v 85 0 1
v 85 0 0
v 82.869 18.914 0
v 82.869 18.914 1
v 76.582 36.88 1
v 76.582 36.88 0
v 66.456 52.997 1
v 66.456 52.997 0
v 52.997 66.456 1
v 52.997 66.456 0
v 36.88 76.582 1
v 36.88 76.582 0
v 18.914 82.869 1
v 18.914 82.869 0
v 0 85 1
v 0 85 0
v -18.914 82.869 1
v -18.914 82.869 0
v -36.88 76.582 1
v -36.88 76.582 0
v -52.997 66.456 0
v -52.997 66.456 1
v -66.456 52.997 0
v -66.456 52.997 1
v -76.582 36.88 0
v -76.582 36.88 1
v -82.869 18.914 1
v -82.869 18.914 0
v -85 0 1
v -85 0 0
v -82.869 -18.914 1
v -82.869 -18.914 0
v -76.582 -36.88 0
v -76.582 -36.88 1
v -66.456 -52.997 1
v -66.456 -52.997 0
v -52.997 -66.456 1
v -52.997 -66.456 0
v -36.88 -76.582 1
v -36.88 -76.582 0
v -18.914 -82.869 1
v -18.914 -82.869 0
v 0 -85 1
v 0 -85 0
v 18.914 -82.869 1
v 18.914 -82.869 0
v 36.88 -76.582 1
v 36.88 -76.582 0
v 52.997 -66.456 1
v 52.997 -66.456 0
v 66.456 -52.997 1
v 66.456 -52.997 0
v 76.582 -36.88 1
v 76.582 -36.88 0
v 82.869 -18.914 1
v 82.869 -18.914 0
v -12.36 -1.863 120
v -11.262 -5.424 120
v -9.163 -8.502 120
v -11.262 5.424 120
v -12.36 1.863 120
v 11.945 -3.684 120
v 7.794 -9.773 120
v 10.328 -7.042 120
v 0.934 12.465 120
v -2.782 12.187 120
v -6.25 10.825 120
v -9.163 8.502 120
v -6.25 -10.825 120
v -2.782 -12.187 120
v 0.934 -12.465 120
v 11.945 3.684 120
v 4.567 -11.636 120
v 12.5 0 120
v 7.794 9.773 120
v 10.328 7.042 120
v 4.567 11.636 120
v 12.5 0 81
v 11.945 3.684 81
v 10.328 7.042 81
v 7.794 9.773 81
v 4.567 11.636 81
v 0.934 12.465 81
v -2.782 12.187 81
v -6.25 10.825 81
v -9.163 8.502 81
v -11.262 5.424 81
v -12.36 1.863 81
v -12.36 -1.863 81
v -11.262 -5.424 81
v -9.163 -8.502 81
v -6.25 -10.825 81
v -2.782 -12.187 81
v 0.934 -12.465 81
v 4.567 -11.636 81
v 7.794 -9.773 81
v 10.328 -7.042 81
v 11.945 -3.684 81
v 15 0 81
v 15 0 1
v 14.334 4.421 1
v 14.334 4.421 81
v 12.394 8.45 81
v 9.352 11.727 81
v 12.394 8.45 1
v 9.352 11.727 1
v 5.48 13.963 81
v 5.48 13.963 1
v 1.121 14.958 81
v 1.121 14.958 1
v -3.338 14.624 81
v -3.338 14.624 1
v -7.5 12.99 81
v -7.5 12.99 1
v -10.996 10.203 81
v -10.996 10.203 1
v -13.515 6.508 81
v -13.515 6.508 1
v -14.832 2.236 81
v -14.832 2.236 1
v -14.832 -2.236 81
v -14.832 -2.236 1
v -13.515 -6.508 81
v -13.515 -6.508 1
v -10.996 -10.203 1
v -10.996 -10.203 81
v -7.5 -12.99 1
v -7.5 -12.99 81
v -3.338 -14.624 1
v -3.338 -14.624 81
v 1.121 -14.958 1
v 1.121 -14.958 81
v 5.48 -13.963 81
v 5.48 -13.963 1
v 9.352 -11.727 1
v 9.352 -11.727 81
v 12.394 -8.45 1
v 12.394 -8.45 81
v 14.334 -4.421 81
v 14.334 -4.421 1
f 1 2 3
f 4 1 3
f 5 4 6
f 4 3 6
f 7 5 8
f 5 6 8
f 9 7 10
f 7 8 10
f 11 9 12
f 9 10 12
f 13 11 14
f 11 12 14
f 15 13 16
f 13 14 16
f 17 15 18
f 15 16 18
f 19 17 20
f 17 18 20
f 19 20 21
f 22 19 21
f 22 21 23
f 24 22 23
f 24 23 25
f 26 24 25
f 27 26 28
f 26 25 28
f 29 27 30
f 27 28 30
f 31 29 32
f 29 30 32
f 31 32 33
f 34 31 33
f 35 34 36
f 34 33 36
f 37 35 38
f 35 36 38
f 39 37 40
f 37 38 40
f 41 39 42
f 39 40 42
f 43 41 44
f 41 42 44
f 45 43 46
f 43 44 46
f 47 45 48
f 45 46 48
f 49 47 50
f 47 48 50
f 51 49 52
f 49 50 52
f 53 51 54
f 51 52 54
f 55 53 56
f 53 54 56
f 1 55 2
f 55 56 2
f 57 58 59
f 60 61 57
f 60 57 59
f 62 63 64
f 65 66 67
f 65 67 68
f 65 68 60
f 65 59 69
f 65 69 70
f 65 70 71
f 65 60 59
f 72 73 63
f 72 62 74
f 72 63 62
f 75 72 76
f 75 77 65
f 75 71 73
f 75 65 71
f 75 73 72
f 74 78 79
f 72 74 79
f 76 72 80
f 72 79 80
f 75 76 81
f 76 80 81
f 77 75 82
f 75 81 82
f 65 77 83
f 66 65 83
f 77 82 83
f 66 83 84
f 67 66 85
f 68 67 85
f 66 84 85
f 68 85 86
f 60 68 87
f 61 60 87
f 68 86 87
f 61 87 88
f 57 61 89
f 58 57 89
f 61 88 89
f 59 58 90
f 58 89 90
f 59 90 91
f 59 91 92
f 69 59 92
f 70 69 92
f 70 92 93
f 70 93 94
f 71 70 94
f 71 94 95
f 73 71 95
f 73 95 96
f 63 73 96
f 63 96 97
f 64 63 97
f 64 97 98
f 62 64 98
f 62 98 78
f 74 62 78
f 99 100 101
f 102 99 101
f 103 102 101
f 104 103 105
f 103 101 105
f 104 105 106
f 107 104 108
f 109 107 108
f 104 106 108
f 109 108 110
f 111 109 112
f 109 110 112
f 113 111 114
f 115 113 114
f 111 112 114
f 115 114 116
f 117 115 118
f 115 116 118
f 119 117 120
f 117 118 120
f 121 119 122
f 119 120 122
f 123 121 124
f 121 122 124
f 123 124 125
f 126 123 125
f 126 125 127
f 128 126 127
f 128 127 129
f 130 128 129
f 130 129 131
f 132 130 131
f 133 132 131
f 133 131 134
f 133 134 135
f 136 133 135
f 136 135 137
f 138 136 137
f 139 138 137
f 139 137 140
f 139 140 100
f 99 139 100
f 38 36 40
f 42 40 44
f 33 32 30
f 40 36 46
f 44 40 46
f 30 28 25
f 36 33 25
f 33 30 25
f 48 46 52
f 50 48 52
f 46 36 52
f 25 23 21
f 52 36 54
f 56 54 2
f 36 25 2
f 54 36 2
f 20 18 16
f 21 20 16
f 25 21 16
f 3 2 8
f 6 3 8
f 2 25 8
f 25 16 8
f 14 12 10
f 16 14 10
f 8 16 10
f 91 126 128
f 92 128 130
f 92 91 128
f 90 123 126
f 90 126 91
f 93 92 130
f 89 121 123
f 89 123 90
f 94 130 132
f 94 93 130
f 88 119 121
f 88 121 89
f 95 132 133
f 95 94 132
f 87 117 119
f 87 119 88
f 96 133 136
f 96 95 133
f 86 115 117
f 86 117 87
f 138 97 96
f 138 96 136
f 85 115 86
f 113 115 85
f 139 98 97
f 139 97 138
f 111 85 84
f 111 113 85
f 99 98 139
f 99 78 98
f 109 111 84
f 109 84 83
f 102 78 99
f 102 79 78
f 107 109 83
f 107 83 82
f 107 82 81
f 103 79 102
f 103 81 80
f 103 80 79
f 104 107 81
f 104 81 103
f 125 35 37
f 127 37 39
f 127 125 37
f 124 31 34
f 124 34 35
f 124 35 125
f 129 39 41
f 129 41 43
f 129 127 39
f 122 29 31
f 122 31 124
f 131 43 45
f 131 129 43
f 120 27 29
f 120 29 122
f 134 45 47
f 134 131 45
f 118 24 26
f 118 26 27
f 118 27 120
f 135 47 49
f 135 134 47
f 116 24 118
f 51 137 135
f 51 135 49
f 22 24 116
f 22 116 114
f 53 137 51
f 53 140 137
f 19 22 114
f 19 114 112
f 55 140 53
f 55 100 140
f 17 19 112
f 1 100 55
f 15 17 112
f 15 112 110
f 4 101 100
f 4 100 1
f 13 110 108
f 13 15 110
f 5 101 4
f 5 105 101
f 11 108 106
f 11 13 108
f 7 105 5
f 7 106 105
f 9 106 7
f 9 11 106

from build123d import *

# Parameters (mm, degrees)
SKETCH_1_R      = 85
SKETCH_1_R_2    = 15
EXTRUDE_1_DEPTH = 1
SKETCH_1_3_R    = 15
EXTRUDE_2_DEPTH = 81
SKETCH_1_4_R    = 12.5
EXTRUDE_3_DEPTH = 120


with BuildPart() as part:
    # 草图1 → 凸台-拉伸1 (new body)
    with BuildSketch(Plane.XY):
        Circle(SKETCH_1_R)
        Circle(SKETCH_1_R_2, mode=Mode.SUBTRACT)
    extrude(amount=EXTRUDE_1_DEPTH)

    # 草图1<3> → 凸台-拉伸2 (add)
    with BuildSketch(Plane.XY):
        Circle(SKETCH_1_3_R)
    extrude(amount=EXTRUDE_2_DEPTH)

    # 草图1<4> → 凸台-拉伸3 (add)
    with BuildSketch(Plane.XY):
        Circle(SKETCH_1_4_R)
    extrude(amount=EXTRUDE_3_DEPTH)


solid = part.part
